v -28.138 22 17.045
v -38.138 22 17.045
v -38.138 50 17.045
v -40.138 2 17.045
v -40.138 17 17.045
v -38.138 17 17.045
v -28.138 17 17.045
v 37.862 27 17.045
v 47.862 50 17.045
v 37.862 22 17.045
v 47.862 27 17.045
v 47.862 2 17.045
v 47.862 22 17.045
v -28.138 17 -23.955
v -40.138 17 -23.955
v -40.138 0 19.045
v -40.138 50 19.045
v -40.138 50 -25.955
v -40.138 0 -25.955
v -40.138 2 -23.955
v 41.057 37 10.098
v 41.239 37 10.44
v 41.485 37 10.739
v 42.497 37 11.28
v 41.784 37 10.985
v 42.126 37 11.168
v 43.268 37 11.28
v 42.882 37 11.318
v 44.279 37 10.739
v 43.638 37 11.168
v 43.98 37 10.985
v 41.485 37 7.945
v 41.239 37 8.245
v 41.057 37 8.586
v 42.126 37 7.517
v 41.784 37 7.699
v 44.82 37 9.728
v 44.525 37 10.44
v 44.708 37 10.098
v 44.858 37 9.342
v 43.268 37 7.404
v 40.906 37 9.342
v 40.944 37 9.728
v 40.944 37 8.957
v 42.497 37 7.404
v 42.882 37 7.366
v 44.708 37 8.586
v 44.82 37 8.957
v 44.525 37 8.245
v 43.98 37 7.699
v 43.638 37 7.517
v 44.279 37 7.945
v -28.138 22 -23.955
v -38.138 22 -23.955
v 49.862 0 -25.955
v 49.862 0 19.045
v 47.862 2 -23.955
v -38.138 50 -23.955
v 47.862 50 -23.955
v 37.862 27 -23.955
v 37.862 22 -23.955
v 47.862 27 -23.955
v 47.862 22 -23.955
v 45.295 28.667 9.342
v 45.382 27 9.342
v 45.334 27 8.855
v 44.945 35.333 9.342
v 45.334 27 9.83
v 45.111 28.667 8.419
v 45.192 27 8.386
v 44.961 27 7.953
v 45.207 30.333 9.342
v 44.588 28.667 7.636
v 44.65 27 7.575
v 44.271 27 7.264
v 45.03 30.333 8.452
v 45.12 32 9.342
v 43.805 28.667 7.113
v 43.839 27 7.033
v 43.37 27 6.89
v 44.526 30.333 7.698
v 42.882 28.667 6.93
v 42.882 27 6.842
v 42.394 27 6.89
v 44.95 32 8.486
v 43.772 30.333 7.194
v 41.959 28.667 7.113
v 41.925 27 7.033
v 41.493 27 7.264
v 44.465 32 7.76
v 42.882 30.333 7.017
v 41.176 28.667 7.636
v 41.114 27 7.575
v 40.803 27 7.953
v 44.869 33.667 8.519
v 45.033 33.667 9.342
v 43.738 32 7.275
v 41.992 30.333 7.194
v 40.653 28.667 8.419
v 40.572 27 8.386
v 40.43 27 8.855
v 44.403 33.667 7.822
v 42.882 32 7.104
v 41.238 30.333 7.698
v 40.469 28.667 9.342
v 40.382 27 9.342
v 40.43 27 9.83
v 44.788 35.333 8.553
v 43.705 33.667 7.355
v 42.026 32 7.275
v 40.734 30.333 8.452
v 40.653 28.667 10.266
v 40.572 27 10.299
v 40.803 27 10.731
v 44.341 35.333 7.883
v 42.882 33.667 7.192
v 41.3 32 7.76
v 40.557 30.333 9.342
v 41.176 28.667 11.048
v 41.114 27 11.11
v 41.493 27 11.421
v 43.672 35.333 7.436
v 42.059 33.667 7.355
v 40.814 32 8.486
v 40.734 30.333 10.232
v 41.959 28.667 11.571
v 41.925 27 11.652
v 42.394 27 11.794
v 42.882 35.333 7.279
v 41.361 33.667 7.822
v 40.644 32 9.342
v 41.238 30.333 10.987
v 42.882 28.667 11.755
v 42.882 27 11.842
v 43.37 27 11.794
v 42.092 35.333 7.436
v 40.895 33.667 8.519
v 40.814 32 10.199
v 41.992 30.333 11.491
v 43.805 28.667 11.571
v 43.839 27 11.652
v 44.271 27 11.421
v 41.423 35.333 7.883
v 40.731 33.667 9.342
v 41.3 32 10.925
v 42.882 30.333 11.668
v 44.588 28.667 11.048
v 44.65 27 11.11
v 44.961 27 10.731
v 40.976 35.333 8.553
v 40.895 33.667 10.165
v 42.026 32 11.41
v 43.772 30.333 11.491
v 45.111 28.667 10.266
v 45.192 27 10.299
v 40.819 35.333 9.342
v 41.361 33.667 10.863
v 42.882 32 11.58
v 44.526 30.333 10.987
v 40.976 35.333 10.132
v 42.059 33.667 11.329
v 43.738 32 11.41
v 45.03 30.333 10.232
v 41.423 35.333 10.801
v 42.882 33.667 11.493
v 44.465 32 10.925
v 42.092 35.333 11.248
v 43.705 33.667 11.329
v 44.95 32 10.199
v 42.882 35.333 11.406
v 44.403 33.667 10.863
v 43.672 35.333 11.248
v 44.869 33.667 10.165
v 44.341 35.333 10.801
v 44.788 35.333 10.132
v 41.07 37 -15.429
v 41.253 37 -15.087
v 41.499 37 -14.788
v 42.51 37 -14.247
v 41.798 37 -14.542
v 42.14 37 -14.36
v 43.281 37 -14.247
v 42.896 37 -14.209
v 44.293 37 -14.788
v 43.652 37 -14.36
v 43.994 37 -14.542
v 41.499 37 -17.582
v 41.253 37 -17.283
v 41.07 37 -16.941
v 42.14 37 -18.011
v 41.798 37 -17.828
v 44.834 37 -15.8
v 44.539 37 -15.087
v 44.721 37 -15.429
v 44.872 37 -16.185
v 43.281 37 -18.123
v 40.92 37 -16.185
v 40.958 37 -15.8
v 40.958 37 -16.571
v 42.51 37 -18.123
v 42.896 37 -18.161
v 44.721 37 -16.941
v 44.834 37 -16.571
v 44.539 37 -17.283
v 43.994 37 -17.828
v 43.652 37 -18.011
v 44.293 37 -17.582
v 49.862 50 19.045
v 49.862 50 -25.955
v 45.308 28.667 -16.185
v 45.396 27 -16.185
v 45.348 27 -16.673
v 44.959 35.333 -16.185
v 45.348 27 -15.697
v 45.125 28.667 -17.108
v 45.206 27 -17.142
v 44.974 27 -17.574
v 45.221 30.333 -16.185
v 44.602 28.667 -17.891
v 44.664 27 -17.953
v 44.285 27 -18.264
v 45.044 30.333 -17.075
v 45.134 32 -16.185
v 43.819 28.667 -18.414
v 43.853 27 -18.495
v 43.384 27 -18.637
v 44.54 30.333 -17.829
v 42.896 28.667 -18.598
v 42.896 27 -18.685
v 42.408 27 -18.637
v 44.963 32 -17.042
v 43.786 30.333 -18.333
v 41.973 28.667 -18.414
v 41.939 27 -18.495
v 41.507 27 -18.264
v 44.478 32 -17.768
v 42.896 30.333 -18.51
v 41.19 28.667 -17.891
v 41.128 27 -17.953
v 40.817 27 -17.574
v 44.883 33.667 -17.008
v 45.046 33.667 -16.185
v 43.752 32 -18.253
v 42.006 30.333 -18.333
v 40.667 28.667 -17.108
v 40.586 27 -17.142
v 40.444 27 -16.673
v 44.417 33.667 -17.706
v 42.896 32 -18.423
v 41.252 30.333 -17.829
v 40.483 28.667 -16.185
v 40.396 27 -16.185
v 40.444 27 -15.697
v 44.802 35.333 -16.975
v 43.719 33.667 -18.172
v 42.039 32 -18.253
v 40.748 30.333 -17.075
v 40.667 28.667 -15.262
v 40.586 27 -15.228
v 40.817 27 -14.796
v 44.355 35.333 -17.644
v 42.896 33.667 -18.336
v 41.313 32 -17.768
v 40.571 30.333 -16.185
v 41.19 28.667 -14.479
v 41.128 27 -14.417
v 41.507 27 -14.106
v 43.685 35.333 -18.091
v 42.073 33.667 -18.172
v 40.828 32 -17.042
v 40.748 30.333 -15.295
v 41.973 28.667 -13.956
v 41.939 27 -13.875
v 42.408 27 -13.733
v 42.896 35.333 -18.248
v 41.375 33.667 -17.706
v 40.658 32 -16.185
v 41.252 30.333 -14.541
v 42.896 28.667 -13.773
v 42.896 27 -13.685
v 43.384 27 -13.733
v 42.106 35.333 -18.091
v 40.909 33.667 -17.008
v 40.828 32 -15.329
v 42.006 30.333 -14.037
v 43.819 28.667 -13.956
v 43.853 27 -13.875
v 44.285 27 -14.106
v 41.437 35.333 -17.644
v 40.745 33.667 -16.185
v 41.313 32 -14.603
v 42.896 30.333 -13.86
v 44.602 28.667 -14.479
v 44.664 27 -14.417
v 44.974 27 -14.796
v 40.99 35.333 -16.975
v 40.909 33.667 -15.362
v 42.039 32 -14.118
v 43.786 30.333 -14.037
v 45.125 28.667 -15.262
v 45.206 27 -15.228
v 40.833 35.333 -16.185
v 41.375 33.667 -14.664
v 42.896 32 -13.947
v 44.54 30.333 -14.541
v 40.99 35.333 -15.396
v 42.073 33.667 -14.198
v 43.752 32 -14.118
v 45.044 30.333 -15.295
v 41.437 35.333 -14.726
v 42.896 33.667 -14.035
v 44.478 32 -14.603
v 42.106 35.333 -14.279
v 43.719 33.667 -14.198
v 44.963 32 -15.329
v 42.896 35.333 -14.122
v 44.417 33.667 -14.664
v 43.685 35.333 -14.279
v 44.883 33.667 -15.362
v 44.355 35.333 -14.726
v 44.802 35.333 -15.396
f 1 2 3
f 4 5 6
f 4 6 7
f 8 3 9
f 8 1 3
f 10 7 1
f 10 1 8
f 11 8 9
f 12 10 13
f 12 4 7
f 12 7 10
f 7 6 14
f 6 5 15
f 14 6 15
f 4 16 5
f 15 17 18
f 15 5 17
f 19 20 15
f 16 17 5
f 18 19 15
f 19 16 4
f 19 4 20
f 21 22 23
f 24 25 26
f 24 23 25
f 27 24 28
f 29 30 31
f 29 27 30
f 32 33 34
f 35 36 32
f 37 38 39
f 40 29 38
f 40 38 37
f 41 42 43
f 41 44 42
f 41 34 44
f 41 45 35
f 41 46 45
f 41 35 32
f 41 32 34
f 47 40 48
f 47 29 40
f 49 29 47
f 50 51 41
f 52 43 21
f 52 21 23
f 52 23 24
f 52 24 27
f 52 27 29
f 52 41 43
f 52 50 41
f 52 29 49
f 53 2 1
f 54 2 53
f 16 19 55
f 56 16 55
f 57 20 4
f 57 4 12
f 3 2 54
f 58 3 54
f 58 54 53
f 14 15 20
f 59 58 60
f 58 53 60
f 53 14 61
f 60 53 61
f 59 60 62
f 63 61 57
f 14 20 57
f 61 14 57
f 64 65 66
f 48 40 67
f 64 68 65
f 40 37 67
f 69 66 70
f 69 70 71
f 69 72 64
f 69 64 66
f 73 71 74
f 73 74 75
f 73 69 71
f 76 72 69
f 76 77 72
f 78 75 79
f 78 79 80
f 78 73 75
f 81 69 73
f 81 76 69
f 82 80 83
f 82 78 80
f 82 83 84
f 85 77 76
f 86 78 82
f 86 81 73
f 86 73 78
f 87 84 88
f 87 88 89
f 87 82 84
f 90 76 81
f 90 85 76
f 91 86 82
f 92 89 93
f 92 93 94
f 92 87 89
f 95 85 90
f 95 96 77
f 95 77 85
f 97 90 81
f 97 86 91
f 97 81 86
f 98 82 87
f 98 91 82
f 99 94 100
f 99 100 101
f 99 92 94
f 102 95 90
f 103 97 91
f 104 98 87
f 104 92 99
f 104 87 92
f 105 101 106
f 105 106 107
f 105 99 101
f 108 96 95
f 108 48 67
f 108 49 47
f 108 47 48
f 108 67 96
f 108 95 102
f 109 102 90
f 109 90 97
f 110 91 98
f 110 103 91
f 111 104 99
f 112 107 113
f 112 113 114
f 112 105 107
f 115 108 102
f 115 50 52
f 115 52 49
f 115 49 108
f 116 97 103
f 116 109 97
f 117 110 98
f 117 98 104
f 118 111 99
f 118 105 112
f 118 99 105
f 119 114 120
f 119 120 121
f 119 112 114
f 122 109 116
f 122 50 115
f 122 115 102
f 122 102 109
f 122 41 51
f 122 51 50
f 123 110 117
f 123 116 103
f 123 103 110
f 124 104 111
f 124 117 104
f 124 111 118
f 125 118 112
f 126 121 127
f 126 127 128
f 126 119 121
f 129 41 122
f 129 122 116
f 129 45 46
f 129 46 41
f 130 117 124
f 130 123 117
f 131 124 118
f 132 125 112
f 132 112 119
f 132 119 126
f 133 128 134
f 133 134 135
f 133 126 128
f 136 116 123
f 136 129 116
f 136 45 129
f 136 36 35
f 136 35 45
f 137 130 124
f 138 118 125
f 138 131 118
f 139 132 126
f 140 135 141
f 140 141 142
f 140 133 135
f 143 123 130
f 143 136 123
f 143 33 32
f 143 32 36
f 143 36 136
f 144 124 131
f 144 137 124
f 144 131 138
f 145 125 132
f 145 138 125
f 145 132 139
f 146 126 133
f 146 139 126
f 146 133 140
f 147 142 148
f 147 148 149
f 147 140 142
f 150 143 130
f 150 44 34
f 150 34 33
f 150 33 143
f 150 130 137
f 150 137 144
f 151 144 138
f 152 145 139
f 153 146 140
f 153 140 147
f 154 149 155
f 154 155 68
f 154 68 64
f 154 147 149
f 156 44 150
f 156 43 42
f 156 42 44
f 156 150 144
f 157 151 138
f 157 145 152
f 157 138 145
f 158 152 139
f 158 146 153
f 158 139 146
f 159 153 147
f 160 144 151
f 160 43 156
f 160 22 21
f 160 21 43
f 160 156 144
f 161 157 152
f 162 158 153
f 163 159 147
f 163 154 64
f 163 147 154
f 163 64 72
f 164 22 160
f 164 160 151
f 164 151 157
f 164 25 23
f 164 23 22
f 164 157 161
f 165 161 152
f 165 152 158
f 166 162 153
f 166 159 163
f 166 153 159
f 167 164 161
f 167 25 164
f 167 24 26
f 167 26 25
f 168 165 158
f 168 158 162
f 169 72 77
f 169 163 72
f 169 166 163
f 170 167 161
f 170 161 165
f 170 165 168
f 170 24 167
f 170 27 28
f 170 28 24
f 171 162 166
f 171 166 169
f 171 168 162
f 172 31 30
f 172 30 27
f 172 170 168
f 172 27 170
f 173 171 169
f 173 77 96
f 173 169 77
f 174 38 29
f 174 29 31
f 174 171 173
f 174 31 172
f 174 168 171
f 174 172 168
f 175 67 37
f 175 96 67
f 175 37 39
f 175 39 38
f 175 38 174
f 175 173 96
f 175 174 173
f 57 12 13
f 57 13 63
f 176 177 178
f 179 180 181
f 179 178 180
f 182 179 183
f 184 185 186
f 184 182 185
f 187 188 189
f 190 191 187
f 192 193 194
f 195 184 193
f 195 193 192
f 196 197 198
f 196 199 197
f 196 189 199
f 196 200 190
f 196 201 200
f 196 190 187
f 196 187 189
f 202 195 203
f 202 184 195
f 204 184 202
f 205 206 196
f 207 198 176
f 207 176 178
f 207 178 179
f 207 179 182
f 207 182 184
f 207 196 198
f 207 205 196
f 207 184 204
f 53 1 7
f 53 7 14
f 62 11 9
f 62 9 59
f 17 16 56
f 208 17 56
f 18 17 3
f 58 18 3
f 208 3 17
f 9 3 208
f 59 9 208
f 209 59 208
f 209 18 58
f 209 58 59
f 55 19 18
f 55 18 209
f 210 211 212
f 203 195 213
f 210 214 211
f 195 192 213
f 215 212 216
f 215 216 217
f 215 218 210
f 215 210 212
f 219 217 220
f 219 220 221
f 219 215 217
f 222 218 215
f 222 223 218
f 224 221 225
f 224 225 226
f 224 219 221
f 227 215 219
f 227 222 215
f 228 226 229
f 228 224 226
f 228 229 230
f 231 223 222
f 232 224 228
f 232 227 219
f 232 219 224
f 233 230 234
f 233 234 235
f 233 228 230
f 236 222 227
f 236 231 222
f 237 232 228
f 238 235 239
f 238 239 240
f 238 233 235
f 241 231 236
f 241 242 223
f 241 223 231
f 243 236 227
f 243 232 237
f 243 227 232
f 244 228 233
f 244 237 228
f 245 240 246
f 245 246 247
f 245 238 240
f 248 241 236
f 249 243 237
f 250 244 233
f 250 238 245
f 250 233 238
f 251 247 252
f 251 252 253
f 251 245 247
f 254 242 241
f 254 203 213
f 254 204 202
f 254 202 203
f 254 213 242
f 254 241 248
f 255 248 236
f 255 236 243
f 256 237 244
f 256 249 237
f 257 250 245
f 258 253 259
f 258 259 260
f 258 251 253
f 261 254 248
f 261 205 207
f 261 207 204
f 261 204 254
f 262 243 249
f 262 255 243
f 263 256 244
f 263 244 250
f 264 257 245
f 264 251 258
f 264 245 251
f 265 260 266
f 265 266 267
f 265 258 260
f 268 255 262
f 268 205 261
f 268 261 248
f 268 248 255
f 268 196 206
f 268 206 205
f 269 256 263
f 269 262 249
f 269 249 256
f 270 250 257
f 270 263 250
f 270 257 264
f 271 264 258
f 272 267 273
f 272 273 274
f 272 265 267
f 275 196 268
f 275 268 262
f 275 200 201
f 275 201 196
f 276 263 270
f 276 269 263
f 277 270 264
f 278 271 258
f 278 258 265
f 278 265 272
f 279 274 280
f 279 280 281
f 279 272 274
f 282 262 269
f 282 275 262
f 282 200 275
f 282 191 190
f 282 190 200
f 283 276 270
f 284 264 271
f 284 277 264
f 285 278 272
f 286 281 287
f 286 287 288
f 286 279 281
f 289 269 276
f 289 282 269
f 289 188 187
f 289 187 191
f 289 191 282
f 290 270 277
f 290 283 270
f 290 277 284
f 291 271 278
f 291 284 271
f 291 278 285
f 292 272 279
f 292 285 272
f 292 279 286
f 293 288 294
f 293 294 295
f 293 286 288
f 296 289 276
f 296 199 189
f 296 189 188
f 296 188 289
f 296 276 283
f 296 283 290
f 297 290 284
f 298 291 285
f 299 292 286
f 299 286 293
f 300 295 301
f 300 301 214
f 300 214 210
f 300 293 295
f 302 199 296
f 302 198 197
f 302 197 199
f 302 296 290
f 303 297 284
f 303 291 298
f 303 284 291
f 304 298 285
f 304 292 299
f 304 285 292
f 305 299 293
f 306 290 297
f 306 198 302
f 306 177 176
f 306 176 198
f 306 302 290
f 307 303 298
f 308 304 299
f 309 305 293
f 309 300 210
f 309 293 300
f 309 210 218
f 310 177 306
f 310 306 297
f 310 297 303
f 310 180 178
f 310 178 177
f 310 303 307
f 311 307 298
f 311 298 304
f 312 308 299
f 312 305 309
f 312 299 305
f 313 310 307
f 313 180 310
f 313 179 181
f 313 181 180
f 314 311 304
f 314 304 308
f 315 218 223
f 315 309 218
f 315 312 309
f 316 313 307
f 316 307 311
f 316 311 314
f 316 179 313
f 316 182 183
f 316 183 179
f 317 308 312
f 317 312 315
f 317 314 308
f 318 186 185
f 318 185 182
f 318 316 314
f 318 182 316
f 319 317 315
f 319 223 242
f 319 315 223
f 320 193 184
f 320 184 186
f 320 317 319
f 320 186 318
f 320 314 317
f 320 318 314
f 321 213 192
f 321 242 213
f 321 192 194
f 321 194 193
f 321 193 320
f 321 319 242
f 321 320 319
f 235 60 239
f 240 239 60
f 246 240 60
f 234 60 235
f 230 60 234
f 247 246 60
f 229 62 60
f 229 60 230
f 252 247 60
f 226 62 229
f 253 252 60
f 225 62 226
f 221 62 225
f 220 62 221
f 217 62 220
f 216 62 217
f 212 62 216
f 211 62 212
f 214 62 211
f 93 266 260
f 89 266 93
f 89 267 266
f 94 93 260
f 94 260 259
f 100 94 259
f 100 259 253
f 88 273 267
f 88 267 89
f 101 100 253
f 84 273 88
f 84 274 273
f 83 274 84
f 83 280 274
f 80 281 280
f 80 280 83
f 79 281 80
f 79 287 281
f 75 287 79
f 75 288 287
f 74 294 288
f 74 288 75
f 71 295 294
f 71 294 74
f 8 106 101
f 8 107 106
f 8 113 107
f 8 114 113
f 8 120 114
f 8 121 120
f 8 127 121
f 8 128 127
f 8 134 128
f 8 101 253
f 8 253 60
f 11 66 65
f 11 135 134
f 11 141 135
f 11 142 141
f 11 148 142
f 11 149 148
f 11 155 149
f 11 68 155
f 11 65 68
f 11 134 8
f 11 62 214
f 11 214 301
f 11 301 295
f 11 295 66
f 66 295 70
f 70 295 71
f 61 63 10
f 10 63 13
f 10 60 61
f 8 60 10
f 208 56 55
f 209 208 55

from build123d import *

# Parameters (mm, degrees)
SKETCH1_W           = 90
SKETCH1_H           = 45
BOSS_EXTRUDE1_DEPTH = 50
SHELL1_T            = -2
SKETCH13_W          = 41.406561997
SKETCH13_H          = 5
BOSS_EXTRUDE3_DEPTH = 10
SKETCH15_W          = 41
SKETCH15_H          = 5
BOSS_EXTRUDE4_DEPTH = 10
SKETCH11_W          = 41
SKETCH11_H          = 15
CUT_EXTRUDE1_DEPTH  = 3
SKETCH26_R          = 2.5
BOSS_EXTRUDE5_DEPTH = 10
BOSS_EXTRUDE5_TAPER = 3
SKETCH27_R          = 2.5
BOSS_EXTRUDE6_DEPTH = 10
BOSS_EXTRUDE6_TAPER = 3


with BuildPart() as part:
    # Sketch1 → Boss-Extrude1 (new body)
    with BuildSketch(Plane(origin=(0, 0, 0), x_dir=(1, 0, 0), z_dir=(0, 1, 0))):
        with Locations((4.862356655, 3.4550978)):
            Rectangle(SKETCH1_W, SKETCH1_H)
    extrude(amount=BOSS_EXTRUDE1_DEPTH)

    # Shell1
    shell1_openings = [part.faces().sort_by_distance(p)[0] for p in [
        (4.862356655, 50, -3.4550978),
    ]]
    offset(amount=SHELL1_T, openings=shell1_openings, kind=Kind.INTERSECTION)

    # Sketch13 → Boss-Extrude3 (add)
    with BuildSketch(Plane(origin=(-38.137643345, 0, 0), x_dir=(0, 0, -1), z_dir=(1, 0, 0))):
        with Locations((3.658378798, 19.5)):
            Rectangle(SKETCH13_W, SKETCH13_H)
    extrude(amount=BOSS_EXTRUDE3_DEPTH)

    # Sketch15 → Boss-Extrude4 (add)
    with BuildSketch(Plane.ZY.offset(-47.862356655)):
        with Locations((-3.4550978, 24.5)):
            Rectangle(SKETCH15_W, SKETCH15_H)
    extrude(amount=BOSS_EXTRUDE4_DEPTH)

    # Sketch11 → Cut-Extrude1 (cut)
    with BuildSketch(Plane(origin=(-38.137643345, 0, 0), x_dir=(0, 0, -1), z_dir=(1, 0, 0))):
        with Locations((3.4550978, 9.5)):
            Rectangle(SKETCH11_W, SKETCH11_H)
    extrude(amount=-CUT_EXTRUDE1_DEPTH, mode=Mode.SUBTRACT)

    # Sketch26 → Boss-Extrude5 (add)
    with BuildSketch(Plane(origin=(0, 27, 0), x_dir=(1, 0, 0), z_dir=(0, 1, 0))):
        with Locations((42.895820428, 16.185162885)):
            Circle(SKETCH26_R)
    extrude(amount=BOSS_EXTRUDE5_DEPTH, taper=BOSS_EXTRUDE5_TAPER)

    # Sketch27 → Boss-Extrude6 (add)
    with BuildSketch(Plane(origin=(0, 27, 0), x_dir=(1, 0, 0), z_dir=(0, 1, 0))):
        with Locations((42.882046205, -9.342272768)):
            Circle(SKETCH27_R)
    extrude(amount=BOSS_EXTRUDE6_DEPTH, taper=BOSS_EXTRUDE6_TAPER)


solid = part.part
